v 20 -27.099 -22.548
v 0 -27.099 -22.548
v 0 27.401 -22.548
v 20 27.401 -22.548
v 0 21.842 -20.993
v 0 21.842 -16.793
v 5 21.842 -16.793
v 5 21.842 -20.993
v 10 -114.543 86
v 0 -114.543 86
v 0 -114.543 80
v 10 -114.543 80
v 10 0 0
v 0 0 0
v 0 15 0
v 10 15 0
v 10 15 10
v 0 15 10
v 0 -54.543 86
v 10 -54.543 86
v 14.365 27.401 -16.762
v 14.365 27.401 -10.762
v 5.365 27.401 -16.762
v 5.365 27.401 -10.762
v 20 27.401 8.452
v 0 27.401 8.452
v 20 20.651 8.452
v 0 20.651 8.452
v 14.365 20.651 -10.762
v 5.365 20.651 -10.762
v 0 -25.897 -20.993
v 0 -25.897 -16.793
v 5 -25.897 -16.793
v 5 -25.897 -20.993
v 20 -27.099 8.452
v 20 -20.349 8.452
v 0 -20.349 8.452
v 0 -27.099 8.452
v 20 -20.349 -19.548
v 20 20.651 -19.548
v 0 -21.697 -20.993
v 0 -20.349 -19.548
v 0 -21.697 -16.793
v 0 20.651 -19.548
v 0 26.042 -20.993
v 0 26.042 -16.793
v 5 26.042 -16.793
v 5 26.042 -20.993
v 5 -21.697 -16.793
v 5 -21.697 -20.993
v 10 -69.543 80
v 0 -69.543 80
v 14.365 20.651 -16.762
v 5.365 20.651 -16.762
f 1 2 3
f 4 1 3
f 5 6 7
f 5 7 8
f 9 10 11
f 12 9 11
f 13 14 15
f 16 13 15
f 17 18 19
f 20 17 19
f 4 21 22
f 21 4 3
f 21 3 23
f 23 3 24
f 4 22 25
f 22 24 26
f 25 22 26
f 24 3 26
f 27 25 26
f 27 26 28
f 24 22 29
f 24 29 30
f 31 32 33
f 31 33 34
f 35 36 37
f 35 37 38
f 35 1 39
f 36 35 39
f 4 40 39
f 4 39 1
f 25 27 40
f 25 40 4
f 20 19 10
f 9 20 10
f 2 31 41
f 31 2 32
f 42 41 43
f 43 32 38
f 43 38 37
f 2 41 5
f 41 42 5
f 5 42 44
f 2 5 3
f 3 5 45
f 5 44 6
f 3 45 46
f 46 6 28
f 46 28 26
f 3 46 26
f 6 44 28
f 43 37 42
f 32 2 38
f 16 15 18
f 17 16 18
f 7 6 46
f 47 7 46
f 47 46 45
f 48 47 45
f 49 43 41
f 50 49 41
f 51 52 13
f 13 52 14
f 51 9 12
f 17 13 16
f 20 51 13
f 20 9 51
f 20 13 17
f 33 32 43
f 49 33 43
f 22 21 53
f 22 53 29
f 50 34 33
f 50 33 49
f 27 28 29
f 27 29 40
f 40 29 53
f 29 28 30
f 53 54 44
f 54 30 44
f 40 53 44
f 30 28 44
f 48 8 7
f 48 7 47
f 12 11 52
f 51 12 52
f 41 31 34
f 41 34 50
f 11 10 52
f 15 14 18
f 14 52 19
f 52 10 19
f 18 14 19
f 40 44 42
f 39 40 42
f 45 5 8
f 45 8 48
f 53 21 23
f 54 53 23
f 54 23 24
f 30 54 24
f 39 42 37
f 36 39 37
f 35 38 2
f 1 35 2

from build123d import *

# Parameters (mm, degrees)
PAD_DEPTH       = 10
PAD001_DEPTH    = 20
SKETCH003_W     = 9
SKETCH003_H     = 6
POCKET_DEPTH    = 8
SKETCH002_W     = 4.2
SKETCH002_H     = 4.2
POCKET001_DEPTH = 5


with BuildPart() as triangleconnectorbody:
    # Sketch → Pad (new body)
    with BuildSketch(Plane.YZ):
        Polygon((0, 0), (15, 0), (15, 10), (-54.542939, 86), (-114.542939, 86), (-114.542939, 80), (-69.542939, 80), align=None)
    extrude(amount=PAD_DEPTH)


with BuildPart() as body001:
    # Sketch001 → Pad001 (new body)
    with BuildSketch(Plane.YZ):
        Polygon((-27.098937, -22.548221), (27.401063, -22.548221), (27.401063, 8.451779), (20.651063, 8.451779), (20.651063, -19.548221), (-20.348937, -19.548221), (-20.348937, 8.451779), (-27.098937, 8.451779), align=None)
    extrude(amount=PAD001_DEPTH)

    # Sketch003 → Pocket (cut)
    with BuildSketch(Plane(origin=(0, 27.401063, 0), x_dir=(-1, 0, 0), z_dir=(0, 1, 0))):
        with Locations((-9.865053, -13.762334)):
            Rectangle(SKETCH003_W, SKETCH003_H)
    extrude(amount=-POCKET_DEPTH, mode=Mode.SUBTRACT)

    # Sketch002 (on Face4 of Pocket) → Pocket001 (cut)
    with BuildSketch(Plane(origin=(0, 0, 0), x_dir=(0, 1, 0), z_dir=(-1, 0, 0))):
        with Locations((-23.796906, 18.893097)):
            Rectangle(SKETCH002_W, SKETCH002_H)
        with Locations((23.941537, 18.893097)):
            Rectangle(SKETCH002_W, SKETCH002_H)
    extrude(amount=-POCKET001_DEPTH, mode=Mode.SUBTRACT)


solid = Compound([triangleconnectorbody.part, body001.part])
